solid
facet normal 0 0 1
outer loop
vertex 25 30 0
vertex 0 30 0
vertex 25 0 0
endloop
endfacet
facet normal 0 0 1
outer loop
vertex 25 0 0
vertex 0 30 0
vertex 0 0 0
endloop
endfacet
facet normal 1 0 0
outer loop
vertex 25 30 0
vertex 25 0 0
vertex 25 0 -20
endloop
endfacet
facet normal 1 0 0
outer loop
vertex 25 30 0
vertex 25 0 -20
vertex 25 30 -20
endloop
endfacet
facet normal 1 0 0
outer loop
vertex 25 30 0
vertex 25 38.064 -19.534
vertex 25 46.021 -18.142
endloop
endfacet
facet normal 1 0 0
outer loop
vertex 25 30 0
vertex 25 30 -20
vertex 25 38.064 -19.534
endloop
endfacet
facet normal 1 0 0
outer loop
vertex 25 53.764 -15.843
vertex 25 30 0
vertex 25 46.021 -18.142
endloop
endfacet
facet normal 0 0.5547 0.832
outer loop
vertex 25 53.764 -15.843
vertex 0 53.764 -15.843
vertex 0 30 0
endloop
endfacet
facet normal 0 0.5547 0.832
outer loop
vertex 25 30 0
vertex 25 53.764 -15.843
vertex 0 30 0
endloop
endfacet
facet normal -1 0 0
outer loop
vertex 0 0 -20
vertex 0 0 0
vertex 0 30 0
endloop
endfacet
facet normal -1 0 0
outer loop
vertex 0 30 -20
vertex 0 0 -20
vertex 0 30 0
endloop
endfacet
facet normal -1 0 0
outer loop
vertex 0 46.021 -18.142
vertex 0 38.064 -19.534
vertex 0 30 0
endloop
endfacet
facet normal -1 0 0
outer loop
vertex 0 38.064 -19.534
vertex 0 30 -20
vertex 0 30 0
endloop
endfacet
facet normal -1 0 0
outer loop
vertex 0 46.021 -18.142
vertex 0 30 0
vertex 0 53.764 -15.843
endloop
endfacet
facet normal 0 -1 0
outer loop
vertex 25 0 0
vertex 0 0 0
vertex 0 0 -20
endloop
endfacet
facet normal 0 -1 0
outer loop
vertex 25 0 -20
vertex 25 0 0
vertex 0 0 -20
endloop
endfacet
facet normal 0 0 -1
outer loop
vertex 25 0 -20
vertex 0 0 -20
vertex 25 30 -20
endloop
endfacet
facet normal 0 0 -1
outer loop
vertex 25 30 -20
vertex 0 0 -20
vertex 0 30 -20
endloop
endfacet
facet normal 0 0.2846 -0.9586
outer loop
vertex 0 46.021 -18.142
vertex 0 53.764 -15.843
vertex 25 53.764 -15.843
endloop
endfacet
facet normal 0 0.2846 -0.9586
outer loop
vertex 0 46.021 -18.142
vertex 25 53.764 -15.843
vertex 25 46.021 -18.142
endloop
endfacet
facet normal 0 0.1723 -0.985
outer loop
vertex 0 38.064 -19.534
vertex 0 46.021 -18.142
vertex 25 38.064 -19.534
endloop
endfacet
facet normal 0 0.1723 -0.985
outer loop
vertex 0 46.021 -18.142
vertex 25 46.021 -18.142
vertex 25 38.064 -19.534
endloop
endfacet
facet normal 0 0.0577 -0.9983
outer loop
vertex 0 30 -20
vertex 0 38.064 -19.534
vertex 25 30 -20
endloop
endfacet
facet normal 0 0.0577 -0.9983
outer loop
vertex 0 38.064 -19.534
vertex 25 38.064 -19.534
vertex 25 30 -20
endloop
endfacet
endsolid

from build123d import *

# Parameters (mm, degrees)
F1_DEPTH = 25
F3_DEPTH = 25


with BuildPart() as f1:
    # F0 (on Right) → F1 (new body)
    with BuildSketch(Plane.YZ):
        Polygon((30, 0), (0, 0), (0, -20), (60, -20), align=None)
    extrude(amount=F1_DEPTH)

    # F2 (on face) → F3 (cut)
    with BuildSketch(Plane.YZ.offset(25)):
        with BuildLine():
            Line((30, -20), (0, -20))
            Line((0, -20), (0, -28))
            Line((0, -28), (72, -28))
            Line((72, -28), (53.764115, -15.842743))
            ThreePointArc((53.764115, -15.842743), (42.062503, -18.952854), (30, -20))
        make_face()
    extrude(amount=-F3_DEPTH, mode=Mode.SUBTRACT)


solid = f1.part
